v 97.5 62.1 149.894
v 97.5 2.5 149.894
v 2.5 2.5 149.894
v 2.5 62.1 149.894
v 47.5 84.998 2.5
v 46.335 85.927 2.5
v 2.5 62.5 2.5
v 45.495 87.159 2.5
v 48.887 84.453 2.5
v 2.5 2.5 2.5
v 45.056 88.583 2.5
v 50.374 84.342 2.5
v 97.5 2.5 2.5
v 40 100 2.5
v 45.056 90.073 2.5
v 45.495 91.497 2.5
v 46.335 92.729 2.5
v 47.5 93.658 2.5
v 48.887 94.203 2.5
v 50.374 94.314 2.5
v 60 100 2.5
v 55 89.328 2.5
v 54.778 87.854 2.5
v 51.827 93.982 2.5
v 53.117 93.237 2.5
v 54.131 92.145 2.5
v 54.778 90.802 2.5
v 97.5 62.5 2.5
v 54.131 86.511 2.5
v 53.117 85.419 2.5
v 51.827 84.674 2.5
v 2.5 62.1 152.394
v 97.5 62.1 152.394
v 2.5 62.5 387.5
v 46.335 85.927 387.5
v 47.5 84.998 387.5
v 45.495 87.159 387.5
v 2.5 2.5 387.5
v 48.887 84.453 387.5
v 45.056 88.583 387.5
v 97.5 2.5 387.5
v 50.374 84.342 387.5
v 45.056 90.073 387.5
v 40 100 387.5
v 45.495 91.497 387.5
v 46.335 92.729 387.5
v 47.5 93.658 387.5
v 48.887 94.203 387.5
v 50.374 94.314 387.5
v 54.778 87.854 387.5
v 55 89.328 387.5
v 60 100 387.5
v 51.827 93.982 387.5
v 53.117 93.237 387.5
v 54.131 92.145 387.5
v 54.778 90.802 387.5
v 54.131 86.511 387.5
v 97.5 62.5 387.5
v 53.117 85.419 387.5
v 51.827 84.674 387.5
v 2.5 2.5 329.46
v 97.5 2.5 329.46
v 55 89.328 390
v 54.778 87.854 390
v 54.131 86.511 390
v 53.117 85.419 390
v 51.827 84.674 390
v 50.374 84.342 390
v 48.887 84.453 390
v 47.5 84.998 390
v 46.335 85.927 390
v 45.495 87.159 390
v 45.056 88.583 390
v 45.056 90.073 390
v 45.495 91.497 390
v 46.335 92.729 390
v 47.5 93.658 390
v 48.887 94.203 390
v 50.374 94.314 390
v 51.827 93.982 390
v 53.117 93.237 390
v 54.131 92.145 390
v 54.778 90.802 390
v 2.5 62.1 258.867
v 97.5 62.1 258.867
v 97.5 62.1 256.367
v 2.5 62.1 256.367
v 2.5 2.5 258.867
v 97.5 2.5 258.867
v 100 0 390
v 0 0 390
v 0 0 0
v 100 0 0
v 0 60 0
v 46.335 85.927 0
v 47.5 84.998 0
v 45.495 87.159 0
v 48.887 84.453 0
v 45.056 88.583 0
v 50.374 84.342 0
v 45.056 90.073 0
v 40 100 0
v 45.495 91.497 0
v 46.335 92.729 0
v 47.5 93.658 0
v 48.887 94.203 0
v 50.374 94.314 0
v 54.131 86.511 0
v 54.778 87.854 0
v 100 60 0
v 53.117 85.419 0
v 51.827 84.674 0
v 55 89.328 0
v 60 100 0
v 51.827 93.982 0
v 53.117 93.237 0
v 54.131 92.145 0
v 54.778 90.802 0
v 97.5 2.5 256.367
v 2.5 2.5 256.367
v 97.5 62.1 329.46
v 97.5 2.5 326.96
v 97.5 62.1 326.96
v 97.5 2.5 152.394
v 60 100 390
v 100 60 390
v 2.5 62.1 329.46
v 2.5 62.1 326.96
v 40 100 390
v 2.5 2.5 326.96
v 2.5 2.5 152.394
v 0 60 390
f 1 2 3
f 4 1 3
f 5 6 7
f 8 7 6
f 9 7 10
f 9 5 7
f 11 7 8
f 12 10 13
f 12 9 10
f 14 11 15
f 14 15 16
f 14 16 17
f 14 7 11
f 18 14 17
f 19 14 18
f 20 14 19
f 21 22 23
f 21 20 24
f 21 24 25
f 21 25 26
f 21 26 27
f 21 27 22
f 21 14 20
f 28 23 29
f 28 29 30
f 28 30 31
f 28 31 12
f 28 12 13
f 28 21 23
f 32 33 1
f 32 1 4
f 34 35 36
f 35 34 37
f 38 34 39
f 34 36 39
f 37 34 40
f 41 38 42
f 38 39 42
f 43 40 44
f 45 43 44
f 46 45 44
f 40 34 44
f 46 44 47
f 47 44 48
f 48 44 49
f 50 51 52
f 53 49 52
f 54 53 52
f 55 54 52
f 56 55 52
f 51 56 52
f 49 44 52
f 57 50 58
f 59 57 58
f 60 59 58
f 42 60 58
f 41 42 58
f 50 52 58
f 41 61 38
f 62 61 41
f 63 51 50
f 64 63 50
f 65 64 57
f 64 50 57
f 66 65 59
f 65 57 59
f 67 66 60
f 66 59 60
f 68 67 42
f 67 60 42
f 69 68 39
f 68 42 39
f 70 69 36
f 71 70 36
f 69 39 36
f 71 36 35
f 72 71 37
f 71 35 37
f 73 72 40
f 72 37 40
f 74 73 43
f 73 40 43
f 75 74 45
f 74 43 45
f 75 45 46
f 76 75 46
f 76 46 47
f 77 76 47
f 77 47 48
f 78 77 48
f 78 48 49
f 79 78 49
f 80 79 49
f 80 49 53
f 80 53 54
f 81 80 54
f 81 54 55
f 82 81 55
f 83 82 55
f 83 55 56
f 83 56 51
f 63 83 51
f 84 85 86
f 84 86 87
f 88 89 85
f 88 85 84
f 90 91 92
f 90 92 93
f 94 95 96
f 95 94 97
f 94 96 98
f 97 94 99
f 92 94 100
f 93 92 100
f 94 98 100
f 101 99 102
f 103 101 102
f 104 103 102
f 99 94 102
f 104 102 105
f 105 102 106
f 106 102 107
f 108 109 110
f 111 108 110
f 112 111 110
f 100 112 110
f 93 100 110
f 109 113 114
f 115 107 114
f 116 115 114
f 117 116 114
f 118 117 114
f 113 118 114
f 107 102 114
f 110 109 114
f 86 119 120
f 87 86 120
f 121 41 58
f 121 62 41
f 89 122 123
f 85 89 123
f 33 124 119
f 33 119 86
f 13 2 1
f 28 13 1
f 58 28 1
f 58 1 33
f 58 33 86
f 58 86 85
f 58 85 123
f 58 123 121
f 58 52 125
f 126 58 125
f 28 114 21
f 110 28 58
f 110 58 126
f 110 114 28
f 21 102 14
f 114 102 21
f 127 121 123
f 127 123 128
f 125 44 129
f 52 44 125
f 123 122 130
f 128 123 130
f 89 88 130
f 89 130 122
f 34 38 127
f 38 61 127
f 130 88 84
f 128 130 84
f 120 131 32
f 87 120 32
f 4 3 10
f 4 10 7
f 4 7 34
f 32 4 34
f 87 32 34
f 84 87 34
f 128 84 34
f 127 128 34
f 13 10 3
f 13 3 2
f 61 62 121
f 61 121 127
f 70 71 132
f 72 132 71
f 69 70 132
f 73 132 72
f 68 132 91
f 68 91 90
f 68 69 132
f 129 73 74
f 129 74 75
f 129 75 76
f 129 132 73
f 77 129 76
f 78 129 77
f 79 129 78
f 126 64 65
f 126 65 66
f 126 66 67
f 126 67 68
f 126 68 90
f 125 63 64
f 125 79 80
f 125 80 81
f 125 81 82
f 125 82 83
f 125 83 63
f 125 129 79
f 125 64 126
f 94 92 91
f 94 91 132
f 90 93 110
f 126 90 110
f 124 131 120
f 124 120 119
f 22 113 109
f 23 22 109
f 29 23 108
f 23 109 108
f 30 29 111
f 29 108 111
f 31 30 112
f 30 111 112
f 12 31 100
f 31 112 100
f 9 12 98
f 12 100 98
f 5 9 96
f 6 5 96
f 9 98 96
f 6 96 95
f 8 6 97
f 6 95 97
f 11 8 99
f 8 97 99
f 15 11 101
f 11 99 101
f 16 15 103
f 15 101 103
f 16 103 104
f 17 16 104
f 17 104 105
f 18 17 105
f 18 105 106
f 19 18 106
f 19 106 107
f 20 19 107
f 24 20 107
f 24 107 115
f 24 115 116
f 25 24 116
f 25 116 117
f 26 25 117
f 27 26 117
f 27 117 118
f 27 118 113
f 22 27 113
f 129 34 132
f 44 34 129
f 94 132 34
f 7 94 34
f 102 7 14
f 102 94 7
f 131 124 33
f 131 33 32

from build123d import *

# Parameters (mm, degrees)
F0_W        = 100
F0_H        = 100
F1_DEPTH    = 390
F2_T        = -2.5
F3_R        = 5
F4_DEPTH    = 2000
F5_T1_DEPTH = 595.7346390373
F6_W        = 95
F6_H        = 2.5
F7_DEPTH    = 59.6


# Not quite as in the source:
# - a fillet or chamfer that OpenCascade refuses, or shapes differently, is made with other operations: its cross-section is extruded or revolved along the edge and cut away or added


with BuildPart() as f1:
    # F0 (on Top) → F1 (new body)
    with BuildSketch(Plane.XY):
        with Locations((50, 50)):
            Rectangle(F0_W, F0_H)
    extrude(amount=F1_DEPTH)

    # F2
    f2_openings = [f1.faces().sort_by_distance(p)[0] for p in [
        (50, 100, 195),
    ]]
    offset(amount=F2_T, openings=f2_openings)

    # F3 (on face) → F4 (cut)
    with BuildSketch(Plane(origin=(0, 0, 0), x_dir=(1, 0, 0), z_dir=(0, 0, -1))):
        with Locations((50, -89.3280655146)):
            Circle(F3_R)
    extrude(amount=-F4_DEPTH, mode=Mode.SUBTRACT)

    # F5: chamfer of 40 on 2 edges, made by hand

    # F5_s2 → F5_t1 (cut)
    with BuildSketch(Plane.XY.offset(-102.8673195186)):
        Polygon((0, 60), (40, 100), (0, 100), align=None)
        Polygon((60, 100), (100, 60), (100, 100), align=None)
    extrude(amount=F5_T1_DEPTH, mode=Mode.SUBTRACT)

    # F6 (on face) → F7 (join)
    with BuildSketch(Plane(origin=(0, 2.5, 0), x_dir=(-1, 0, 0), z_dir=(0, 1, 0))):
        with Locations((-50, 328.2103848457)):
            Rectangle(F6_W, F6_H)
        with Locations((-50, 257.6169383526)):
            Rectangle(F6_W, F6_H)
        with Locations((-50, 151.1440885067)):
            Rectangle(F6_W, F6_H)
    extrude(amount=F7_DEPTH)


solid = f1.part
